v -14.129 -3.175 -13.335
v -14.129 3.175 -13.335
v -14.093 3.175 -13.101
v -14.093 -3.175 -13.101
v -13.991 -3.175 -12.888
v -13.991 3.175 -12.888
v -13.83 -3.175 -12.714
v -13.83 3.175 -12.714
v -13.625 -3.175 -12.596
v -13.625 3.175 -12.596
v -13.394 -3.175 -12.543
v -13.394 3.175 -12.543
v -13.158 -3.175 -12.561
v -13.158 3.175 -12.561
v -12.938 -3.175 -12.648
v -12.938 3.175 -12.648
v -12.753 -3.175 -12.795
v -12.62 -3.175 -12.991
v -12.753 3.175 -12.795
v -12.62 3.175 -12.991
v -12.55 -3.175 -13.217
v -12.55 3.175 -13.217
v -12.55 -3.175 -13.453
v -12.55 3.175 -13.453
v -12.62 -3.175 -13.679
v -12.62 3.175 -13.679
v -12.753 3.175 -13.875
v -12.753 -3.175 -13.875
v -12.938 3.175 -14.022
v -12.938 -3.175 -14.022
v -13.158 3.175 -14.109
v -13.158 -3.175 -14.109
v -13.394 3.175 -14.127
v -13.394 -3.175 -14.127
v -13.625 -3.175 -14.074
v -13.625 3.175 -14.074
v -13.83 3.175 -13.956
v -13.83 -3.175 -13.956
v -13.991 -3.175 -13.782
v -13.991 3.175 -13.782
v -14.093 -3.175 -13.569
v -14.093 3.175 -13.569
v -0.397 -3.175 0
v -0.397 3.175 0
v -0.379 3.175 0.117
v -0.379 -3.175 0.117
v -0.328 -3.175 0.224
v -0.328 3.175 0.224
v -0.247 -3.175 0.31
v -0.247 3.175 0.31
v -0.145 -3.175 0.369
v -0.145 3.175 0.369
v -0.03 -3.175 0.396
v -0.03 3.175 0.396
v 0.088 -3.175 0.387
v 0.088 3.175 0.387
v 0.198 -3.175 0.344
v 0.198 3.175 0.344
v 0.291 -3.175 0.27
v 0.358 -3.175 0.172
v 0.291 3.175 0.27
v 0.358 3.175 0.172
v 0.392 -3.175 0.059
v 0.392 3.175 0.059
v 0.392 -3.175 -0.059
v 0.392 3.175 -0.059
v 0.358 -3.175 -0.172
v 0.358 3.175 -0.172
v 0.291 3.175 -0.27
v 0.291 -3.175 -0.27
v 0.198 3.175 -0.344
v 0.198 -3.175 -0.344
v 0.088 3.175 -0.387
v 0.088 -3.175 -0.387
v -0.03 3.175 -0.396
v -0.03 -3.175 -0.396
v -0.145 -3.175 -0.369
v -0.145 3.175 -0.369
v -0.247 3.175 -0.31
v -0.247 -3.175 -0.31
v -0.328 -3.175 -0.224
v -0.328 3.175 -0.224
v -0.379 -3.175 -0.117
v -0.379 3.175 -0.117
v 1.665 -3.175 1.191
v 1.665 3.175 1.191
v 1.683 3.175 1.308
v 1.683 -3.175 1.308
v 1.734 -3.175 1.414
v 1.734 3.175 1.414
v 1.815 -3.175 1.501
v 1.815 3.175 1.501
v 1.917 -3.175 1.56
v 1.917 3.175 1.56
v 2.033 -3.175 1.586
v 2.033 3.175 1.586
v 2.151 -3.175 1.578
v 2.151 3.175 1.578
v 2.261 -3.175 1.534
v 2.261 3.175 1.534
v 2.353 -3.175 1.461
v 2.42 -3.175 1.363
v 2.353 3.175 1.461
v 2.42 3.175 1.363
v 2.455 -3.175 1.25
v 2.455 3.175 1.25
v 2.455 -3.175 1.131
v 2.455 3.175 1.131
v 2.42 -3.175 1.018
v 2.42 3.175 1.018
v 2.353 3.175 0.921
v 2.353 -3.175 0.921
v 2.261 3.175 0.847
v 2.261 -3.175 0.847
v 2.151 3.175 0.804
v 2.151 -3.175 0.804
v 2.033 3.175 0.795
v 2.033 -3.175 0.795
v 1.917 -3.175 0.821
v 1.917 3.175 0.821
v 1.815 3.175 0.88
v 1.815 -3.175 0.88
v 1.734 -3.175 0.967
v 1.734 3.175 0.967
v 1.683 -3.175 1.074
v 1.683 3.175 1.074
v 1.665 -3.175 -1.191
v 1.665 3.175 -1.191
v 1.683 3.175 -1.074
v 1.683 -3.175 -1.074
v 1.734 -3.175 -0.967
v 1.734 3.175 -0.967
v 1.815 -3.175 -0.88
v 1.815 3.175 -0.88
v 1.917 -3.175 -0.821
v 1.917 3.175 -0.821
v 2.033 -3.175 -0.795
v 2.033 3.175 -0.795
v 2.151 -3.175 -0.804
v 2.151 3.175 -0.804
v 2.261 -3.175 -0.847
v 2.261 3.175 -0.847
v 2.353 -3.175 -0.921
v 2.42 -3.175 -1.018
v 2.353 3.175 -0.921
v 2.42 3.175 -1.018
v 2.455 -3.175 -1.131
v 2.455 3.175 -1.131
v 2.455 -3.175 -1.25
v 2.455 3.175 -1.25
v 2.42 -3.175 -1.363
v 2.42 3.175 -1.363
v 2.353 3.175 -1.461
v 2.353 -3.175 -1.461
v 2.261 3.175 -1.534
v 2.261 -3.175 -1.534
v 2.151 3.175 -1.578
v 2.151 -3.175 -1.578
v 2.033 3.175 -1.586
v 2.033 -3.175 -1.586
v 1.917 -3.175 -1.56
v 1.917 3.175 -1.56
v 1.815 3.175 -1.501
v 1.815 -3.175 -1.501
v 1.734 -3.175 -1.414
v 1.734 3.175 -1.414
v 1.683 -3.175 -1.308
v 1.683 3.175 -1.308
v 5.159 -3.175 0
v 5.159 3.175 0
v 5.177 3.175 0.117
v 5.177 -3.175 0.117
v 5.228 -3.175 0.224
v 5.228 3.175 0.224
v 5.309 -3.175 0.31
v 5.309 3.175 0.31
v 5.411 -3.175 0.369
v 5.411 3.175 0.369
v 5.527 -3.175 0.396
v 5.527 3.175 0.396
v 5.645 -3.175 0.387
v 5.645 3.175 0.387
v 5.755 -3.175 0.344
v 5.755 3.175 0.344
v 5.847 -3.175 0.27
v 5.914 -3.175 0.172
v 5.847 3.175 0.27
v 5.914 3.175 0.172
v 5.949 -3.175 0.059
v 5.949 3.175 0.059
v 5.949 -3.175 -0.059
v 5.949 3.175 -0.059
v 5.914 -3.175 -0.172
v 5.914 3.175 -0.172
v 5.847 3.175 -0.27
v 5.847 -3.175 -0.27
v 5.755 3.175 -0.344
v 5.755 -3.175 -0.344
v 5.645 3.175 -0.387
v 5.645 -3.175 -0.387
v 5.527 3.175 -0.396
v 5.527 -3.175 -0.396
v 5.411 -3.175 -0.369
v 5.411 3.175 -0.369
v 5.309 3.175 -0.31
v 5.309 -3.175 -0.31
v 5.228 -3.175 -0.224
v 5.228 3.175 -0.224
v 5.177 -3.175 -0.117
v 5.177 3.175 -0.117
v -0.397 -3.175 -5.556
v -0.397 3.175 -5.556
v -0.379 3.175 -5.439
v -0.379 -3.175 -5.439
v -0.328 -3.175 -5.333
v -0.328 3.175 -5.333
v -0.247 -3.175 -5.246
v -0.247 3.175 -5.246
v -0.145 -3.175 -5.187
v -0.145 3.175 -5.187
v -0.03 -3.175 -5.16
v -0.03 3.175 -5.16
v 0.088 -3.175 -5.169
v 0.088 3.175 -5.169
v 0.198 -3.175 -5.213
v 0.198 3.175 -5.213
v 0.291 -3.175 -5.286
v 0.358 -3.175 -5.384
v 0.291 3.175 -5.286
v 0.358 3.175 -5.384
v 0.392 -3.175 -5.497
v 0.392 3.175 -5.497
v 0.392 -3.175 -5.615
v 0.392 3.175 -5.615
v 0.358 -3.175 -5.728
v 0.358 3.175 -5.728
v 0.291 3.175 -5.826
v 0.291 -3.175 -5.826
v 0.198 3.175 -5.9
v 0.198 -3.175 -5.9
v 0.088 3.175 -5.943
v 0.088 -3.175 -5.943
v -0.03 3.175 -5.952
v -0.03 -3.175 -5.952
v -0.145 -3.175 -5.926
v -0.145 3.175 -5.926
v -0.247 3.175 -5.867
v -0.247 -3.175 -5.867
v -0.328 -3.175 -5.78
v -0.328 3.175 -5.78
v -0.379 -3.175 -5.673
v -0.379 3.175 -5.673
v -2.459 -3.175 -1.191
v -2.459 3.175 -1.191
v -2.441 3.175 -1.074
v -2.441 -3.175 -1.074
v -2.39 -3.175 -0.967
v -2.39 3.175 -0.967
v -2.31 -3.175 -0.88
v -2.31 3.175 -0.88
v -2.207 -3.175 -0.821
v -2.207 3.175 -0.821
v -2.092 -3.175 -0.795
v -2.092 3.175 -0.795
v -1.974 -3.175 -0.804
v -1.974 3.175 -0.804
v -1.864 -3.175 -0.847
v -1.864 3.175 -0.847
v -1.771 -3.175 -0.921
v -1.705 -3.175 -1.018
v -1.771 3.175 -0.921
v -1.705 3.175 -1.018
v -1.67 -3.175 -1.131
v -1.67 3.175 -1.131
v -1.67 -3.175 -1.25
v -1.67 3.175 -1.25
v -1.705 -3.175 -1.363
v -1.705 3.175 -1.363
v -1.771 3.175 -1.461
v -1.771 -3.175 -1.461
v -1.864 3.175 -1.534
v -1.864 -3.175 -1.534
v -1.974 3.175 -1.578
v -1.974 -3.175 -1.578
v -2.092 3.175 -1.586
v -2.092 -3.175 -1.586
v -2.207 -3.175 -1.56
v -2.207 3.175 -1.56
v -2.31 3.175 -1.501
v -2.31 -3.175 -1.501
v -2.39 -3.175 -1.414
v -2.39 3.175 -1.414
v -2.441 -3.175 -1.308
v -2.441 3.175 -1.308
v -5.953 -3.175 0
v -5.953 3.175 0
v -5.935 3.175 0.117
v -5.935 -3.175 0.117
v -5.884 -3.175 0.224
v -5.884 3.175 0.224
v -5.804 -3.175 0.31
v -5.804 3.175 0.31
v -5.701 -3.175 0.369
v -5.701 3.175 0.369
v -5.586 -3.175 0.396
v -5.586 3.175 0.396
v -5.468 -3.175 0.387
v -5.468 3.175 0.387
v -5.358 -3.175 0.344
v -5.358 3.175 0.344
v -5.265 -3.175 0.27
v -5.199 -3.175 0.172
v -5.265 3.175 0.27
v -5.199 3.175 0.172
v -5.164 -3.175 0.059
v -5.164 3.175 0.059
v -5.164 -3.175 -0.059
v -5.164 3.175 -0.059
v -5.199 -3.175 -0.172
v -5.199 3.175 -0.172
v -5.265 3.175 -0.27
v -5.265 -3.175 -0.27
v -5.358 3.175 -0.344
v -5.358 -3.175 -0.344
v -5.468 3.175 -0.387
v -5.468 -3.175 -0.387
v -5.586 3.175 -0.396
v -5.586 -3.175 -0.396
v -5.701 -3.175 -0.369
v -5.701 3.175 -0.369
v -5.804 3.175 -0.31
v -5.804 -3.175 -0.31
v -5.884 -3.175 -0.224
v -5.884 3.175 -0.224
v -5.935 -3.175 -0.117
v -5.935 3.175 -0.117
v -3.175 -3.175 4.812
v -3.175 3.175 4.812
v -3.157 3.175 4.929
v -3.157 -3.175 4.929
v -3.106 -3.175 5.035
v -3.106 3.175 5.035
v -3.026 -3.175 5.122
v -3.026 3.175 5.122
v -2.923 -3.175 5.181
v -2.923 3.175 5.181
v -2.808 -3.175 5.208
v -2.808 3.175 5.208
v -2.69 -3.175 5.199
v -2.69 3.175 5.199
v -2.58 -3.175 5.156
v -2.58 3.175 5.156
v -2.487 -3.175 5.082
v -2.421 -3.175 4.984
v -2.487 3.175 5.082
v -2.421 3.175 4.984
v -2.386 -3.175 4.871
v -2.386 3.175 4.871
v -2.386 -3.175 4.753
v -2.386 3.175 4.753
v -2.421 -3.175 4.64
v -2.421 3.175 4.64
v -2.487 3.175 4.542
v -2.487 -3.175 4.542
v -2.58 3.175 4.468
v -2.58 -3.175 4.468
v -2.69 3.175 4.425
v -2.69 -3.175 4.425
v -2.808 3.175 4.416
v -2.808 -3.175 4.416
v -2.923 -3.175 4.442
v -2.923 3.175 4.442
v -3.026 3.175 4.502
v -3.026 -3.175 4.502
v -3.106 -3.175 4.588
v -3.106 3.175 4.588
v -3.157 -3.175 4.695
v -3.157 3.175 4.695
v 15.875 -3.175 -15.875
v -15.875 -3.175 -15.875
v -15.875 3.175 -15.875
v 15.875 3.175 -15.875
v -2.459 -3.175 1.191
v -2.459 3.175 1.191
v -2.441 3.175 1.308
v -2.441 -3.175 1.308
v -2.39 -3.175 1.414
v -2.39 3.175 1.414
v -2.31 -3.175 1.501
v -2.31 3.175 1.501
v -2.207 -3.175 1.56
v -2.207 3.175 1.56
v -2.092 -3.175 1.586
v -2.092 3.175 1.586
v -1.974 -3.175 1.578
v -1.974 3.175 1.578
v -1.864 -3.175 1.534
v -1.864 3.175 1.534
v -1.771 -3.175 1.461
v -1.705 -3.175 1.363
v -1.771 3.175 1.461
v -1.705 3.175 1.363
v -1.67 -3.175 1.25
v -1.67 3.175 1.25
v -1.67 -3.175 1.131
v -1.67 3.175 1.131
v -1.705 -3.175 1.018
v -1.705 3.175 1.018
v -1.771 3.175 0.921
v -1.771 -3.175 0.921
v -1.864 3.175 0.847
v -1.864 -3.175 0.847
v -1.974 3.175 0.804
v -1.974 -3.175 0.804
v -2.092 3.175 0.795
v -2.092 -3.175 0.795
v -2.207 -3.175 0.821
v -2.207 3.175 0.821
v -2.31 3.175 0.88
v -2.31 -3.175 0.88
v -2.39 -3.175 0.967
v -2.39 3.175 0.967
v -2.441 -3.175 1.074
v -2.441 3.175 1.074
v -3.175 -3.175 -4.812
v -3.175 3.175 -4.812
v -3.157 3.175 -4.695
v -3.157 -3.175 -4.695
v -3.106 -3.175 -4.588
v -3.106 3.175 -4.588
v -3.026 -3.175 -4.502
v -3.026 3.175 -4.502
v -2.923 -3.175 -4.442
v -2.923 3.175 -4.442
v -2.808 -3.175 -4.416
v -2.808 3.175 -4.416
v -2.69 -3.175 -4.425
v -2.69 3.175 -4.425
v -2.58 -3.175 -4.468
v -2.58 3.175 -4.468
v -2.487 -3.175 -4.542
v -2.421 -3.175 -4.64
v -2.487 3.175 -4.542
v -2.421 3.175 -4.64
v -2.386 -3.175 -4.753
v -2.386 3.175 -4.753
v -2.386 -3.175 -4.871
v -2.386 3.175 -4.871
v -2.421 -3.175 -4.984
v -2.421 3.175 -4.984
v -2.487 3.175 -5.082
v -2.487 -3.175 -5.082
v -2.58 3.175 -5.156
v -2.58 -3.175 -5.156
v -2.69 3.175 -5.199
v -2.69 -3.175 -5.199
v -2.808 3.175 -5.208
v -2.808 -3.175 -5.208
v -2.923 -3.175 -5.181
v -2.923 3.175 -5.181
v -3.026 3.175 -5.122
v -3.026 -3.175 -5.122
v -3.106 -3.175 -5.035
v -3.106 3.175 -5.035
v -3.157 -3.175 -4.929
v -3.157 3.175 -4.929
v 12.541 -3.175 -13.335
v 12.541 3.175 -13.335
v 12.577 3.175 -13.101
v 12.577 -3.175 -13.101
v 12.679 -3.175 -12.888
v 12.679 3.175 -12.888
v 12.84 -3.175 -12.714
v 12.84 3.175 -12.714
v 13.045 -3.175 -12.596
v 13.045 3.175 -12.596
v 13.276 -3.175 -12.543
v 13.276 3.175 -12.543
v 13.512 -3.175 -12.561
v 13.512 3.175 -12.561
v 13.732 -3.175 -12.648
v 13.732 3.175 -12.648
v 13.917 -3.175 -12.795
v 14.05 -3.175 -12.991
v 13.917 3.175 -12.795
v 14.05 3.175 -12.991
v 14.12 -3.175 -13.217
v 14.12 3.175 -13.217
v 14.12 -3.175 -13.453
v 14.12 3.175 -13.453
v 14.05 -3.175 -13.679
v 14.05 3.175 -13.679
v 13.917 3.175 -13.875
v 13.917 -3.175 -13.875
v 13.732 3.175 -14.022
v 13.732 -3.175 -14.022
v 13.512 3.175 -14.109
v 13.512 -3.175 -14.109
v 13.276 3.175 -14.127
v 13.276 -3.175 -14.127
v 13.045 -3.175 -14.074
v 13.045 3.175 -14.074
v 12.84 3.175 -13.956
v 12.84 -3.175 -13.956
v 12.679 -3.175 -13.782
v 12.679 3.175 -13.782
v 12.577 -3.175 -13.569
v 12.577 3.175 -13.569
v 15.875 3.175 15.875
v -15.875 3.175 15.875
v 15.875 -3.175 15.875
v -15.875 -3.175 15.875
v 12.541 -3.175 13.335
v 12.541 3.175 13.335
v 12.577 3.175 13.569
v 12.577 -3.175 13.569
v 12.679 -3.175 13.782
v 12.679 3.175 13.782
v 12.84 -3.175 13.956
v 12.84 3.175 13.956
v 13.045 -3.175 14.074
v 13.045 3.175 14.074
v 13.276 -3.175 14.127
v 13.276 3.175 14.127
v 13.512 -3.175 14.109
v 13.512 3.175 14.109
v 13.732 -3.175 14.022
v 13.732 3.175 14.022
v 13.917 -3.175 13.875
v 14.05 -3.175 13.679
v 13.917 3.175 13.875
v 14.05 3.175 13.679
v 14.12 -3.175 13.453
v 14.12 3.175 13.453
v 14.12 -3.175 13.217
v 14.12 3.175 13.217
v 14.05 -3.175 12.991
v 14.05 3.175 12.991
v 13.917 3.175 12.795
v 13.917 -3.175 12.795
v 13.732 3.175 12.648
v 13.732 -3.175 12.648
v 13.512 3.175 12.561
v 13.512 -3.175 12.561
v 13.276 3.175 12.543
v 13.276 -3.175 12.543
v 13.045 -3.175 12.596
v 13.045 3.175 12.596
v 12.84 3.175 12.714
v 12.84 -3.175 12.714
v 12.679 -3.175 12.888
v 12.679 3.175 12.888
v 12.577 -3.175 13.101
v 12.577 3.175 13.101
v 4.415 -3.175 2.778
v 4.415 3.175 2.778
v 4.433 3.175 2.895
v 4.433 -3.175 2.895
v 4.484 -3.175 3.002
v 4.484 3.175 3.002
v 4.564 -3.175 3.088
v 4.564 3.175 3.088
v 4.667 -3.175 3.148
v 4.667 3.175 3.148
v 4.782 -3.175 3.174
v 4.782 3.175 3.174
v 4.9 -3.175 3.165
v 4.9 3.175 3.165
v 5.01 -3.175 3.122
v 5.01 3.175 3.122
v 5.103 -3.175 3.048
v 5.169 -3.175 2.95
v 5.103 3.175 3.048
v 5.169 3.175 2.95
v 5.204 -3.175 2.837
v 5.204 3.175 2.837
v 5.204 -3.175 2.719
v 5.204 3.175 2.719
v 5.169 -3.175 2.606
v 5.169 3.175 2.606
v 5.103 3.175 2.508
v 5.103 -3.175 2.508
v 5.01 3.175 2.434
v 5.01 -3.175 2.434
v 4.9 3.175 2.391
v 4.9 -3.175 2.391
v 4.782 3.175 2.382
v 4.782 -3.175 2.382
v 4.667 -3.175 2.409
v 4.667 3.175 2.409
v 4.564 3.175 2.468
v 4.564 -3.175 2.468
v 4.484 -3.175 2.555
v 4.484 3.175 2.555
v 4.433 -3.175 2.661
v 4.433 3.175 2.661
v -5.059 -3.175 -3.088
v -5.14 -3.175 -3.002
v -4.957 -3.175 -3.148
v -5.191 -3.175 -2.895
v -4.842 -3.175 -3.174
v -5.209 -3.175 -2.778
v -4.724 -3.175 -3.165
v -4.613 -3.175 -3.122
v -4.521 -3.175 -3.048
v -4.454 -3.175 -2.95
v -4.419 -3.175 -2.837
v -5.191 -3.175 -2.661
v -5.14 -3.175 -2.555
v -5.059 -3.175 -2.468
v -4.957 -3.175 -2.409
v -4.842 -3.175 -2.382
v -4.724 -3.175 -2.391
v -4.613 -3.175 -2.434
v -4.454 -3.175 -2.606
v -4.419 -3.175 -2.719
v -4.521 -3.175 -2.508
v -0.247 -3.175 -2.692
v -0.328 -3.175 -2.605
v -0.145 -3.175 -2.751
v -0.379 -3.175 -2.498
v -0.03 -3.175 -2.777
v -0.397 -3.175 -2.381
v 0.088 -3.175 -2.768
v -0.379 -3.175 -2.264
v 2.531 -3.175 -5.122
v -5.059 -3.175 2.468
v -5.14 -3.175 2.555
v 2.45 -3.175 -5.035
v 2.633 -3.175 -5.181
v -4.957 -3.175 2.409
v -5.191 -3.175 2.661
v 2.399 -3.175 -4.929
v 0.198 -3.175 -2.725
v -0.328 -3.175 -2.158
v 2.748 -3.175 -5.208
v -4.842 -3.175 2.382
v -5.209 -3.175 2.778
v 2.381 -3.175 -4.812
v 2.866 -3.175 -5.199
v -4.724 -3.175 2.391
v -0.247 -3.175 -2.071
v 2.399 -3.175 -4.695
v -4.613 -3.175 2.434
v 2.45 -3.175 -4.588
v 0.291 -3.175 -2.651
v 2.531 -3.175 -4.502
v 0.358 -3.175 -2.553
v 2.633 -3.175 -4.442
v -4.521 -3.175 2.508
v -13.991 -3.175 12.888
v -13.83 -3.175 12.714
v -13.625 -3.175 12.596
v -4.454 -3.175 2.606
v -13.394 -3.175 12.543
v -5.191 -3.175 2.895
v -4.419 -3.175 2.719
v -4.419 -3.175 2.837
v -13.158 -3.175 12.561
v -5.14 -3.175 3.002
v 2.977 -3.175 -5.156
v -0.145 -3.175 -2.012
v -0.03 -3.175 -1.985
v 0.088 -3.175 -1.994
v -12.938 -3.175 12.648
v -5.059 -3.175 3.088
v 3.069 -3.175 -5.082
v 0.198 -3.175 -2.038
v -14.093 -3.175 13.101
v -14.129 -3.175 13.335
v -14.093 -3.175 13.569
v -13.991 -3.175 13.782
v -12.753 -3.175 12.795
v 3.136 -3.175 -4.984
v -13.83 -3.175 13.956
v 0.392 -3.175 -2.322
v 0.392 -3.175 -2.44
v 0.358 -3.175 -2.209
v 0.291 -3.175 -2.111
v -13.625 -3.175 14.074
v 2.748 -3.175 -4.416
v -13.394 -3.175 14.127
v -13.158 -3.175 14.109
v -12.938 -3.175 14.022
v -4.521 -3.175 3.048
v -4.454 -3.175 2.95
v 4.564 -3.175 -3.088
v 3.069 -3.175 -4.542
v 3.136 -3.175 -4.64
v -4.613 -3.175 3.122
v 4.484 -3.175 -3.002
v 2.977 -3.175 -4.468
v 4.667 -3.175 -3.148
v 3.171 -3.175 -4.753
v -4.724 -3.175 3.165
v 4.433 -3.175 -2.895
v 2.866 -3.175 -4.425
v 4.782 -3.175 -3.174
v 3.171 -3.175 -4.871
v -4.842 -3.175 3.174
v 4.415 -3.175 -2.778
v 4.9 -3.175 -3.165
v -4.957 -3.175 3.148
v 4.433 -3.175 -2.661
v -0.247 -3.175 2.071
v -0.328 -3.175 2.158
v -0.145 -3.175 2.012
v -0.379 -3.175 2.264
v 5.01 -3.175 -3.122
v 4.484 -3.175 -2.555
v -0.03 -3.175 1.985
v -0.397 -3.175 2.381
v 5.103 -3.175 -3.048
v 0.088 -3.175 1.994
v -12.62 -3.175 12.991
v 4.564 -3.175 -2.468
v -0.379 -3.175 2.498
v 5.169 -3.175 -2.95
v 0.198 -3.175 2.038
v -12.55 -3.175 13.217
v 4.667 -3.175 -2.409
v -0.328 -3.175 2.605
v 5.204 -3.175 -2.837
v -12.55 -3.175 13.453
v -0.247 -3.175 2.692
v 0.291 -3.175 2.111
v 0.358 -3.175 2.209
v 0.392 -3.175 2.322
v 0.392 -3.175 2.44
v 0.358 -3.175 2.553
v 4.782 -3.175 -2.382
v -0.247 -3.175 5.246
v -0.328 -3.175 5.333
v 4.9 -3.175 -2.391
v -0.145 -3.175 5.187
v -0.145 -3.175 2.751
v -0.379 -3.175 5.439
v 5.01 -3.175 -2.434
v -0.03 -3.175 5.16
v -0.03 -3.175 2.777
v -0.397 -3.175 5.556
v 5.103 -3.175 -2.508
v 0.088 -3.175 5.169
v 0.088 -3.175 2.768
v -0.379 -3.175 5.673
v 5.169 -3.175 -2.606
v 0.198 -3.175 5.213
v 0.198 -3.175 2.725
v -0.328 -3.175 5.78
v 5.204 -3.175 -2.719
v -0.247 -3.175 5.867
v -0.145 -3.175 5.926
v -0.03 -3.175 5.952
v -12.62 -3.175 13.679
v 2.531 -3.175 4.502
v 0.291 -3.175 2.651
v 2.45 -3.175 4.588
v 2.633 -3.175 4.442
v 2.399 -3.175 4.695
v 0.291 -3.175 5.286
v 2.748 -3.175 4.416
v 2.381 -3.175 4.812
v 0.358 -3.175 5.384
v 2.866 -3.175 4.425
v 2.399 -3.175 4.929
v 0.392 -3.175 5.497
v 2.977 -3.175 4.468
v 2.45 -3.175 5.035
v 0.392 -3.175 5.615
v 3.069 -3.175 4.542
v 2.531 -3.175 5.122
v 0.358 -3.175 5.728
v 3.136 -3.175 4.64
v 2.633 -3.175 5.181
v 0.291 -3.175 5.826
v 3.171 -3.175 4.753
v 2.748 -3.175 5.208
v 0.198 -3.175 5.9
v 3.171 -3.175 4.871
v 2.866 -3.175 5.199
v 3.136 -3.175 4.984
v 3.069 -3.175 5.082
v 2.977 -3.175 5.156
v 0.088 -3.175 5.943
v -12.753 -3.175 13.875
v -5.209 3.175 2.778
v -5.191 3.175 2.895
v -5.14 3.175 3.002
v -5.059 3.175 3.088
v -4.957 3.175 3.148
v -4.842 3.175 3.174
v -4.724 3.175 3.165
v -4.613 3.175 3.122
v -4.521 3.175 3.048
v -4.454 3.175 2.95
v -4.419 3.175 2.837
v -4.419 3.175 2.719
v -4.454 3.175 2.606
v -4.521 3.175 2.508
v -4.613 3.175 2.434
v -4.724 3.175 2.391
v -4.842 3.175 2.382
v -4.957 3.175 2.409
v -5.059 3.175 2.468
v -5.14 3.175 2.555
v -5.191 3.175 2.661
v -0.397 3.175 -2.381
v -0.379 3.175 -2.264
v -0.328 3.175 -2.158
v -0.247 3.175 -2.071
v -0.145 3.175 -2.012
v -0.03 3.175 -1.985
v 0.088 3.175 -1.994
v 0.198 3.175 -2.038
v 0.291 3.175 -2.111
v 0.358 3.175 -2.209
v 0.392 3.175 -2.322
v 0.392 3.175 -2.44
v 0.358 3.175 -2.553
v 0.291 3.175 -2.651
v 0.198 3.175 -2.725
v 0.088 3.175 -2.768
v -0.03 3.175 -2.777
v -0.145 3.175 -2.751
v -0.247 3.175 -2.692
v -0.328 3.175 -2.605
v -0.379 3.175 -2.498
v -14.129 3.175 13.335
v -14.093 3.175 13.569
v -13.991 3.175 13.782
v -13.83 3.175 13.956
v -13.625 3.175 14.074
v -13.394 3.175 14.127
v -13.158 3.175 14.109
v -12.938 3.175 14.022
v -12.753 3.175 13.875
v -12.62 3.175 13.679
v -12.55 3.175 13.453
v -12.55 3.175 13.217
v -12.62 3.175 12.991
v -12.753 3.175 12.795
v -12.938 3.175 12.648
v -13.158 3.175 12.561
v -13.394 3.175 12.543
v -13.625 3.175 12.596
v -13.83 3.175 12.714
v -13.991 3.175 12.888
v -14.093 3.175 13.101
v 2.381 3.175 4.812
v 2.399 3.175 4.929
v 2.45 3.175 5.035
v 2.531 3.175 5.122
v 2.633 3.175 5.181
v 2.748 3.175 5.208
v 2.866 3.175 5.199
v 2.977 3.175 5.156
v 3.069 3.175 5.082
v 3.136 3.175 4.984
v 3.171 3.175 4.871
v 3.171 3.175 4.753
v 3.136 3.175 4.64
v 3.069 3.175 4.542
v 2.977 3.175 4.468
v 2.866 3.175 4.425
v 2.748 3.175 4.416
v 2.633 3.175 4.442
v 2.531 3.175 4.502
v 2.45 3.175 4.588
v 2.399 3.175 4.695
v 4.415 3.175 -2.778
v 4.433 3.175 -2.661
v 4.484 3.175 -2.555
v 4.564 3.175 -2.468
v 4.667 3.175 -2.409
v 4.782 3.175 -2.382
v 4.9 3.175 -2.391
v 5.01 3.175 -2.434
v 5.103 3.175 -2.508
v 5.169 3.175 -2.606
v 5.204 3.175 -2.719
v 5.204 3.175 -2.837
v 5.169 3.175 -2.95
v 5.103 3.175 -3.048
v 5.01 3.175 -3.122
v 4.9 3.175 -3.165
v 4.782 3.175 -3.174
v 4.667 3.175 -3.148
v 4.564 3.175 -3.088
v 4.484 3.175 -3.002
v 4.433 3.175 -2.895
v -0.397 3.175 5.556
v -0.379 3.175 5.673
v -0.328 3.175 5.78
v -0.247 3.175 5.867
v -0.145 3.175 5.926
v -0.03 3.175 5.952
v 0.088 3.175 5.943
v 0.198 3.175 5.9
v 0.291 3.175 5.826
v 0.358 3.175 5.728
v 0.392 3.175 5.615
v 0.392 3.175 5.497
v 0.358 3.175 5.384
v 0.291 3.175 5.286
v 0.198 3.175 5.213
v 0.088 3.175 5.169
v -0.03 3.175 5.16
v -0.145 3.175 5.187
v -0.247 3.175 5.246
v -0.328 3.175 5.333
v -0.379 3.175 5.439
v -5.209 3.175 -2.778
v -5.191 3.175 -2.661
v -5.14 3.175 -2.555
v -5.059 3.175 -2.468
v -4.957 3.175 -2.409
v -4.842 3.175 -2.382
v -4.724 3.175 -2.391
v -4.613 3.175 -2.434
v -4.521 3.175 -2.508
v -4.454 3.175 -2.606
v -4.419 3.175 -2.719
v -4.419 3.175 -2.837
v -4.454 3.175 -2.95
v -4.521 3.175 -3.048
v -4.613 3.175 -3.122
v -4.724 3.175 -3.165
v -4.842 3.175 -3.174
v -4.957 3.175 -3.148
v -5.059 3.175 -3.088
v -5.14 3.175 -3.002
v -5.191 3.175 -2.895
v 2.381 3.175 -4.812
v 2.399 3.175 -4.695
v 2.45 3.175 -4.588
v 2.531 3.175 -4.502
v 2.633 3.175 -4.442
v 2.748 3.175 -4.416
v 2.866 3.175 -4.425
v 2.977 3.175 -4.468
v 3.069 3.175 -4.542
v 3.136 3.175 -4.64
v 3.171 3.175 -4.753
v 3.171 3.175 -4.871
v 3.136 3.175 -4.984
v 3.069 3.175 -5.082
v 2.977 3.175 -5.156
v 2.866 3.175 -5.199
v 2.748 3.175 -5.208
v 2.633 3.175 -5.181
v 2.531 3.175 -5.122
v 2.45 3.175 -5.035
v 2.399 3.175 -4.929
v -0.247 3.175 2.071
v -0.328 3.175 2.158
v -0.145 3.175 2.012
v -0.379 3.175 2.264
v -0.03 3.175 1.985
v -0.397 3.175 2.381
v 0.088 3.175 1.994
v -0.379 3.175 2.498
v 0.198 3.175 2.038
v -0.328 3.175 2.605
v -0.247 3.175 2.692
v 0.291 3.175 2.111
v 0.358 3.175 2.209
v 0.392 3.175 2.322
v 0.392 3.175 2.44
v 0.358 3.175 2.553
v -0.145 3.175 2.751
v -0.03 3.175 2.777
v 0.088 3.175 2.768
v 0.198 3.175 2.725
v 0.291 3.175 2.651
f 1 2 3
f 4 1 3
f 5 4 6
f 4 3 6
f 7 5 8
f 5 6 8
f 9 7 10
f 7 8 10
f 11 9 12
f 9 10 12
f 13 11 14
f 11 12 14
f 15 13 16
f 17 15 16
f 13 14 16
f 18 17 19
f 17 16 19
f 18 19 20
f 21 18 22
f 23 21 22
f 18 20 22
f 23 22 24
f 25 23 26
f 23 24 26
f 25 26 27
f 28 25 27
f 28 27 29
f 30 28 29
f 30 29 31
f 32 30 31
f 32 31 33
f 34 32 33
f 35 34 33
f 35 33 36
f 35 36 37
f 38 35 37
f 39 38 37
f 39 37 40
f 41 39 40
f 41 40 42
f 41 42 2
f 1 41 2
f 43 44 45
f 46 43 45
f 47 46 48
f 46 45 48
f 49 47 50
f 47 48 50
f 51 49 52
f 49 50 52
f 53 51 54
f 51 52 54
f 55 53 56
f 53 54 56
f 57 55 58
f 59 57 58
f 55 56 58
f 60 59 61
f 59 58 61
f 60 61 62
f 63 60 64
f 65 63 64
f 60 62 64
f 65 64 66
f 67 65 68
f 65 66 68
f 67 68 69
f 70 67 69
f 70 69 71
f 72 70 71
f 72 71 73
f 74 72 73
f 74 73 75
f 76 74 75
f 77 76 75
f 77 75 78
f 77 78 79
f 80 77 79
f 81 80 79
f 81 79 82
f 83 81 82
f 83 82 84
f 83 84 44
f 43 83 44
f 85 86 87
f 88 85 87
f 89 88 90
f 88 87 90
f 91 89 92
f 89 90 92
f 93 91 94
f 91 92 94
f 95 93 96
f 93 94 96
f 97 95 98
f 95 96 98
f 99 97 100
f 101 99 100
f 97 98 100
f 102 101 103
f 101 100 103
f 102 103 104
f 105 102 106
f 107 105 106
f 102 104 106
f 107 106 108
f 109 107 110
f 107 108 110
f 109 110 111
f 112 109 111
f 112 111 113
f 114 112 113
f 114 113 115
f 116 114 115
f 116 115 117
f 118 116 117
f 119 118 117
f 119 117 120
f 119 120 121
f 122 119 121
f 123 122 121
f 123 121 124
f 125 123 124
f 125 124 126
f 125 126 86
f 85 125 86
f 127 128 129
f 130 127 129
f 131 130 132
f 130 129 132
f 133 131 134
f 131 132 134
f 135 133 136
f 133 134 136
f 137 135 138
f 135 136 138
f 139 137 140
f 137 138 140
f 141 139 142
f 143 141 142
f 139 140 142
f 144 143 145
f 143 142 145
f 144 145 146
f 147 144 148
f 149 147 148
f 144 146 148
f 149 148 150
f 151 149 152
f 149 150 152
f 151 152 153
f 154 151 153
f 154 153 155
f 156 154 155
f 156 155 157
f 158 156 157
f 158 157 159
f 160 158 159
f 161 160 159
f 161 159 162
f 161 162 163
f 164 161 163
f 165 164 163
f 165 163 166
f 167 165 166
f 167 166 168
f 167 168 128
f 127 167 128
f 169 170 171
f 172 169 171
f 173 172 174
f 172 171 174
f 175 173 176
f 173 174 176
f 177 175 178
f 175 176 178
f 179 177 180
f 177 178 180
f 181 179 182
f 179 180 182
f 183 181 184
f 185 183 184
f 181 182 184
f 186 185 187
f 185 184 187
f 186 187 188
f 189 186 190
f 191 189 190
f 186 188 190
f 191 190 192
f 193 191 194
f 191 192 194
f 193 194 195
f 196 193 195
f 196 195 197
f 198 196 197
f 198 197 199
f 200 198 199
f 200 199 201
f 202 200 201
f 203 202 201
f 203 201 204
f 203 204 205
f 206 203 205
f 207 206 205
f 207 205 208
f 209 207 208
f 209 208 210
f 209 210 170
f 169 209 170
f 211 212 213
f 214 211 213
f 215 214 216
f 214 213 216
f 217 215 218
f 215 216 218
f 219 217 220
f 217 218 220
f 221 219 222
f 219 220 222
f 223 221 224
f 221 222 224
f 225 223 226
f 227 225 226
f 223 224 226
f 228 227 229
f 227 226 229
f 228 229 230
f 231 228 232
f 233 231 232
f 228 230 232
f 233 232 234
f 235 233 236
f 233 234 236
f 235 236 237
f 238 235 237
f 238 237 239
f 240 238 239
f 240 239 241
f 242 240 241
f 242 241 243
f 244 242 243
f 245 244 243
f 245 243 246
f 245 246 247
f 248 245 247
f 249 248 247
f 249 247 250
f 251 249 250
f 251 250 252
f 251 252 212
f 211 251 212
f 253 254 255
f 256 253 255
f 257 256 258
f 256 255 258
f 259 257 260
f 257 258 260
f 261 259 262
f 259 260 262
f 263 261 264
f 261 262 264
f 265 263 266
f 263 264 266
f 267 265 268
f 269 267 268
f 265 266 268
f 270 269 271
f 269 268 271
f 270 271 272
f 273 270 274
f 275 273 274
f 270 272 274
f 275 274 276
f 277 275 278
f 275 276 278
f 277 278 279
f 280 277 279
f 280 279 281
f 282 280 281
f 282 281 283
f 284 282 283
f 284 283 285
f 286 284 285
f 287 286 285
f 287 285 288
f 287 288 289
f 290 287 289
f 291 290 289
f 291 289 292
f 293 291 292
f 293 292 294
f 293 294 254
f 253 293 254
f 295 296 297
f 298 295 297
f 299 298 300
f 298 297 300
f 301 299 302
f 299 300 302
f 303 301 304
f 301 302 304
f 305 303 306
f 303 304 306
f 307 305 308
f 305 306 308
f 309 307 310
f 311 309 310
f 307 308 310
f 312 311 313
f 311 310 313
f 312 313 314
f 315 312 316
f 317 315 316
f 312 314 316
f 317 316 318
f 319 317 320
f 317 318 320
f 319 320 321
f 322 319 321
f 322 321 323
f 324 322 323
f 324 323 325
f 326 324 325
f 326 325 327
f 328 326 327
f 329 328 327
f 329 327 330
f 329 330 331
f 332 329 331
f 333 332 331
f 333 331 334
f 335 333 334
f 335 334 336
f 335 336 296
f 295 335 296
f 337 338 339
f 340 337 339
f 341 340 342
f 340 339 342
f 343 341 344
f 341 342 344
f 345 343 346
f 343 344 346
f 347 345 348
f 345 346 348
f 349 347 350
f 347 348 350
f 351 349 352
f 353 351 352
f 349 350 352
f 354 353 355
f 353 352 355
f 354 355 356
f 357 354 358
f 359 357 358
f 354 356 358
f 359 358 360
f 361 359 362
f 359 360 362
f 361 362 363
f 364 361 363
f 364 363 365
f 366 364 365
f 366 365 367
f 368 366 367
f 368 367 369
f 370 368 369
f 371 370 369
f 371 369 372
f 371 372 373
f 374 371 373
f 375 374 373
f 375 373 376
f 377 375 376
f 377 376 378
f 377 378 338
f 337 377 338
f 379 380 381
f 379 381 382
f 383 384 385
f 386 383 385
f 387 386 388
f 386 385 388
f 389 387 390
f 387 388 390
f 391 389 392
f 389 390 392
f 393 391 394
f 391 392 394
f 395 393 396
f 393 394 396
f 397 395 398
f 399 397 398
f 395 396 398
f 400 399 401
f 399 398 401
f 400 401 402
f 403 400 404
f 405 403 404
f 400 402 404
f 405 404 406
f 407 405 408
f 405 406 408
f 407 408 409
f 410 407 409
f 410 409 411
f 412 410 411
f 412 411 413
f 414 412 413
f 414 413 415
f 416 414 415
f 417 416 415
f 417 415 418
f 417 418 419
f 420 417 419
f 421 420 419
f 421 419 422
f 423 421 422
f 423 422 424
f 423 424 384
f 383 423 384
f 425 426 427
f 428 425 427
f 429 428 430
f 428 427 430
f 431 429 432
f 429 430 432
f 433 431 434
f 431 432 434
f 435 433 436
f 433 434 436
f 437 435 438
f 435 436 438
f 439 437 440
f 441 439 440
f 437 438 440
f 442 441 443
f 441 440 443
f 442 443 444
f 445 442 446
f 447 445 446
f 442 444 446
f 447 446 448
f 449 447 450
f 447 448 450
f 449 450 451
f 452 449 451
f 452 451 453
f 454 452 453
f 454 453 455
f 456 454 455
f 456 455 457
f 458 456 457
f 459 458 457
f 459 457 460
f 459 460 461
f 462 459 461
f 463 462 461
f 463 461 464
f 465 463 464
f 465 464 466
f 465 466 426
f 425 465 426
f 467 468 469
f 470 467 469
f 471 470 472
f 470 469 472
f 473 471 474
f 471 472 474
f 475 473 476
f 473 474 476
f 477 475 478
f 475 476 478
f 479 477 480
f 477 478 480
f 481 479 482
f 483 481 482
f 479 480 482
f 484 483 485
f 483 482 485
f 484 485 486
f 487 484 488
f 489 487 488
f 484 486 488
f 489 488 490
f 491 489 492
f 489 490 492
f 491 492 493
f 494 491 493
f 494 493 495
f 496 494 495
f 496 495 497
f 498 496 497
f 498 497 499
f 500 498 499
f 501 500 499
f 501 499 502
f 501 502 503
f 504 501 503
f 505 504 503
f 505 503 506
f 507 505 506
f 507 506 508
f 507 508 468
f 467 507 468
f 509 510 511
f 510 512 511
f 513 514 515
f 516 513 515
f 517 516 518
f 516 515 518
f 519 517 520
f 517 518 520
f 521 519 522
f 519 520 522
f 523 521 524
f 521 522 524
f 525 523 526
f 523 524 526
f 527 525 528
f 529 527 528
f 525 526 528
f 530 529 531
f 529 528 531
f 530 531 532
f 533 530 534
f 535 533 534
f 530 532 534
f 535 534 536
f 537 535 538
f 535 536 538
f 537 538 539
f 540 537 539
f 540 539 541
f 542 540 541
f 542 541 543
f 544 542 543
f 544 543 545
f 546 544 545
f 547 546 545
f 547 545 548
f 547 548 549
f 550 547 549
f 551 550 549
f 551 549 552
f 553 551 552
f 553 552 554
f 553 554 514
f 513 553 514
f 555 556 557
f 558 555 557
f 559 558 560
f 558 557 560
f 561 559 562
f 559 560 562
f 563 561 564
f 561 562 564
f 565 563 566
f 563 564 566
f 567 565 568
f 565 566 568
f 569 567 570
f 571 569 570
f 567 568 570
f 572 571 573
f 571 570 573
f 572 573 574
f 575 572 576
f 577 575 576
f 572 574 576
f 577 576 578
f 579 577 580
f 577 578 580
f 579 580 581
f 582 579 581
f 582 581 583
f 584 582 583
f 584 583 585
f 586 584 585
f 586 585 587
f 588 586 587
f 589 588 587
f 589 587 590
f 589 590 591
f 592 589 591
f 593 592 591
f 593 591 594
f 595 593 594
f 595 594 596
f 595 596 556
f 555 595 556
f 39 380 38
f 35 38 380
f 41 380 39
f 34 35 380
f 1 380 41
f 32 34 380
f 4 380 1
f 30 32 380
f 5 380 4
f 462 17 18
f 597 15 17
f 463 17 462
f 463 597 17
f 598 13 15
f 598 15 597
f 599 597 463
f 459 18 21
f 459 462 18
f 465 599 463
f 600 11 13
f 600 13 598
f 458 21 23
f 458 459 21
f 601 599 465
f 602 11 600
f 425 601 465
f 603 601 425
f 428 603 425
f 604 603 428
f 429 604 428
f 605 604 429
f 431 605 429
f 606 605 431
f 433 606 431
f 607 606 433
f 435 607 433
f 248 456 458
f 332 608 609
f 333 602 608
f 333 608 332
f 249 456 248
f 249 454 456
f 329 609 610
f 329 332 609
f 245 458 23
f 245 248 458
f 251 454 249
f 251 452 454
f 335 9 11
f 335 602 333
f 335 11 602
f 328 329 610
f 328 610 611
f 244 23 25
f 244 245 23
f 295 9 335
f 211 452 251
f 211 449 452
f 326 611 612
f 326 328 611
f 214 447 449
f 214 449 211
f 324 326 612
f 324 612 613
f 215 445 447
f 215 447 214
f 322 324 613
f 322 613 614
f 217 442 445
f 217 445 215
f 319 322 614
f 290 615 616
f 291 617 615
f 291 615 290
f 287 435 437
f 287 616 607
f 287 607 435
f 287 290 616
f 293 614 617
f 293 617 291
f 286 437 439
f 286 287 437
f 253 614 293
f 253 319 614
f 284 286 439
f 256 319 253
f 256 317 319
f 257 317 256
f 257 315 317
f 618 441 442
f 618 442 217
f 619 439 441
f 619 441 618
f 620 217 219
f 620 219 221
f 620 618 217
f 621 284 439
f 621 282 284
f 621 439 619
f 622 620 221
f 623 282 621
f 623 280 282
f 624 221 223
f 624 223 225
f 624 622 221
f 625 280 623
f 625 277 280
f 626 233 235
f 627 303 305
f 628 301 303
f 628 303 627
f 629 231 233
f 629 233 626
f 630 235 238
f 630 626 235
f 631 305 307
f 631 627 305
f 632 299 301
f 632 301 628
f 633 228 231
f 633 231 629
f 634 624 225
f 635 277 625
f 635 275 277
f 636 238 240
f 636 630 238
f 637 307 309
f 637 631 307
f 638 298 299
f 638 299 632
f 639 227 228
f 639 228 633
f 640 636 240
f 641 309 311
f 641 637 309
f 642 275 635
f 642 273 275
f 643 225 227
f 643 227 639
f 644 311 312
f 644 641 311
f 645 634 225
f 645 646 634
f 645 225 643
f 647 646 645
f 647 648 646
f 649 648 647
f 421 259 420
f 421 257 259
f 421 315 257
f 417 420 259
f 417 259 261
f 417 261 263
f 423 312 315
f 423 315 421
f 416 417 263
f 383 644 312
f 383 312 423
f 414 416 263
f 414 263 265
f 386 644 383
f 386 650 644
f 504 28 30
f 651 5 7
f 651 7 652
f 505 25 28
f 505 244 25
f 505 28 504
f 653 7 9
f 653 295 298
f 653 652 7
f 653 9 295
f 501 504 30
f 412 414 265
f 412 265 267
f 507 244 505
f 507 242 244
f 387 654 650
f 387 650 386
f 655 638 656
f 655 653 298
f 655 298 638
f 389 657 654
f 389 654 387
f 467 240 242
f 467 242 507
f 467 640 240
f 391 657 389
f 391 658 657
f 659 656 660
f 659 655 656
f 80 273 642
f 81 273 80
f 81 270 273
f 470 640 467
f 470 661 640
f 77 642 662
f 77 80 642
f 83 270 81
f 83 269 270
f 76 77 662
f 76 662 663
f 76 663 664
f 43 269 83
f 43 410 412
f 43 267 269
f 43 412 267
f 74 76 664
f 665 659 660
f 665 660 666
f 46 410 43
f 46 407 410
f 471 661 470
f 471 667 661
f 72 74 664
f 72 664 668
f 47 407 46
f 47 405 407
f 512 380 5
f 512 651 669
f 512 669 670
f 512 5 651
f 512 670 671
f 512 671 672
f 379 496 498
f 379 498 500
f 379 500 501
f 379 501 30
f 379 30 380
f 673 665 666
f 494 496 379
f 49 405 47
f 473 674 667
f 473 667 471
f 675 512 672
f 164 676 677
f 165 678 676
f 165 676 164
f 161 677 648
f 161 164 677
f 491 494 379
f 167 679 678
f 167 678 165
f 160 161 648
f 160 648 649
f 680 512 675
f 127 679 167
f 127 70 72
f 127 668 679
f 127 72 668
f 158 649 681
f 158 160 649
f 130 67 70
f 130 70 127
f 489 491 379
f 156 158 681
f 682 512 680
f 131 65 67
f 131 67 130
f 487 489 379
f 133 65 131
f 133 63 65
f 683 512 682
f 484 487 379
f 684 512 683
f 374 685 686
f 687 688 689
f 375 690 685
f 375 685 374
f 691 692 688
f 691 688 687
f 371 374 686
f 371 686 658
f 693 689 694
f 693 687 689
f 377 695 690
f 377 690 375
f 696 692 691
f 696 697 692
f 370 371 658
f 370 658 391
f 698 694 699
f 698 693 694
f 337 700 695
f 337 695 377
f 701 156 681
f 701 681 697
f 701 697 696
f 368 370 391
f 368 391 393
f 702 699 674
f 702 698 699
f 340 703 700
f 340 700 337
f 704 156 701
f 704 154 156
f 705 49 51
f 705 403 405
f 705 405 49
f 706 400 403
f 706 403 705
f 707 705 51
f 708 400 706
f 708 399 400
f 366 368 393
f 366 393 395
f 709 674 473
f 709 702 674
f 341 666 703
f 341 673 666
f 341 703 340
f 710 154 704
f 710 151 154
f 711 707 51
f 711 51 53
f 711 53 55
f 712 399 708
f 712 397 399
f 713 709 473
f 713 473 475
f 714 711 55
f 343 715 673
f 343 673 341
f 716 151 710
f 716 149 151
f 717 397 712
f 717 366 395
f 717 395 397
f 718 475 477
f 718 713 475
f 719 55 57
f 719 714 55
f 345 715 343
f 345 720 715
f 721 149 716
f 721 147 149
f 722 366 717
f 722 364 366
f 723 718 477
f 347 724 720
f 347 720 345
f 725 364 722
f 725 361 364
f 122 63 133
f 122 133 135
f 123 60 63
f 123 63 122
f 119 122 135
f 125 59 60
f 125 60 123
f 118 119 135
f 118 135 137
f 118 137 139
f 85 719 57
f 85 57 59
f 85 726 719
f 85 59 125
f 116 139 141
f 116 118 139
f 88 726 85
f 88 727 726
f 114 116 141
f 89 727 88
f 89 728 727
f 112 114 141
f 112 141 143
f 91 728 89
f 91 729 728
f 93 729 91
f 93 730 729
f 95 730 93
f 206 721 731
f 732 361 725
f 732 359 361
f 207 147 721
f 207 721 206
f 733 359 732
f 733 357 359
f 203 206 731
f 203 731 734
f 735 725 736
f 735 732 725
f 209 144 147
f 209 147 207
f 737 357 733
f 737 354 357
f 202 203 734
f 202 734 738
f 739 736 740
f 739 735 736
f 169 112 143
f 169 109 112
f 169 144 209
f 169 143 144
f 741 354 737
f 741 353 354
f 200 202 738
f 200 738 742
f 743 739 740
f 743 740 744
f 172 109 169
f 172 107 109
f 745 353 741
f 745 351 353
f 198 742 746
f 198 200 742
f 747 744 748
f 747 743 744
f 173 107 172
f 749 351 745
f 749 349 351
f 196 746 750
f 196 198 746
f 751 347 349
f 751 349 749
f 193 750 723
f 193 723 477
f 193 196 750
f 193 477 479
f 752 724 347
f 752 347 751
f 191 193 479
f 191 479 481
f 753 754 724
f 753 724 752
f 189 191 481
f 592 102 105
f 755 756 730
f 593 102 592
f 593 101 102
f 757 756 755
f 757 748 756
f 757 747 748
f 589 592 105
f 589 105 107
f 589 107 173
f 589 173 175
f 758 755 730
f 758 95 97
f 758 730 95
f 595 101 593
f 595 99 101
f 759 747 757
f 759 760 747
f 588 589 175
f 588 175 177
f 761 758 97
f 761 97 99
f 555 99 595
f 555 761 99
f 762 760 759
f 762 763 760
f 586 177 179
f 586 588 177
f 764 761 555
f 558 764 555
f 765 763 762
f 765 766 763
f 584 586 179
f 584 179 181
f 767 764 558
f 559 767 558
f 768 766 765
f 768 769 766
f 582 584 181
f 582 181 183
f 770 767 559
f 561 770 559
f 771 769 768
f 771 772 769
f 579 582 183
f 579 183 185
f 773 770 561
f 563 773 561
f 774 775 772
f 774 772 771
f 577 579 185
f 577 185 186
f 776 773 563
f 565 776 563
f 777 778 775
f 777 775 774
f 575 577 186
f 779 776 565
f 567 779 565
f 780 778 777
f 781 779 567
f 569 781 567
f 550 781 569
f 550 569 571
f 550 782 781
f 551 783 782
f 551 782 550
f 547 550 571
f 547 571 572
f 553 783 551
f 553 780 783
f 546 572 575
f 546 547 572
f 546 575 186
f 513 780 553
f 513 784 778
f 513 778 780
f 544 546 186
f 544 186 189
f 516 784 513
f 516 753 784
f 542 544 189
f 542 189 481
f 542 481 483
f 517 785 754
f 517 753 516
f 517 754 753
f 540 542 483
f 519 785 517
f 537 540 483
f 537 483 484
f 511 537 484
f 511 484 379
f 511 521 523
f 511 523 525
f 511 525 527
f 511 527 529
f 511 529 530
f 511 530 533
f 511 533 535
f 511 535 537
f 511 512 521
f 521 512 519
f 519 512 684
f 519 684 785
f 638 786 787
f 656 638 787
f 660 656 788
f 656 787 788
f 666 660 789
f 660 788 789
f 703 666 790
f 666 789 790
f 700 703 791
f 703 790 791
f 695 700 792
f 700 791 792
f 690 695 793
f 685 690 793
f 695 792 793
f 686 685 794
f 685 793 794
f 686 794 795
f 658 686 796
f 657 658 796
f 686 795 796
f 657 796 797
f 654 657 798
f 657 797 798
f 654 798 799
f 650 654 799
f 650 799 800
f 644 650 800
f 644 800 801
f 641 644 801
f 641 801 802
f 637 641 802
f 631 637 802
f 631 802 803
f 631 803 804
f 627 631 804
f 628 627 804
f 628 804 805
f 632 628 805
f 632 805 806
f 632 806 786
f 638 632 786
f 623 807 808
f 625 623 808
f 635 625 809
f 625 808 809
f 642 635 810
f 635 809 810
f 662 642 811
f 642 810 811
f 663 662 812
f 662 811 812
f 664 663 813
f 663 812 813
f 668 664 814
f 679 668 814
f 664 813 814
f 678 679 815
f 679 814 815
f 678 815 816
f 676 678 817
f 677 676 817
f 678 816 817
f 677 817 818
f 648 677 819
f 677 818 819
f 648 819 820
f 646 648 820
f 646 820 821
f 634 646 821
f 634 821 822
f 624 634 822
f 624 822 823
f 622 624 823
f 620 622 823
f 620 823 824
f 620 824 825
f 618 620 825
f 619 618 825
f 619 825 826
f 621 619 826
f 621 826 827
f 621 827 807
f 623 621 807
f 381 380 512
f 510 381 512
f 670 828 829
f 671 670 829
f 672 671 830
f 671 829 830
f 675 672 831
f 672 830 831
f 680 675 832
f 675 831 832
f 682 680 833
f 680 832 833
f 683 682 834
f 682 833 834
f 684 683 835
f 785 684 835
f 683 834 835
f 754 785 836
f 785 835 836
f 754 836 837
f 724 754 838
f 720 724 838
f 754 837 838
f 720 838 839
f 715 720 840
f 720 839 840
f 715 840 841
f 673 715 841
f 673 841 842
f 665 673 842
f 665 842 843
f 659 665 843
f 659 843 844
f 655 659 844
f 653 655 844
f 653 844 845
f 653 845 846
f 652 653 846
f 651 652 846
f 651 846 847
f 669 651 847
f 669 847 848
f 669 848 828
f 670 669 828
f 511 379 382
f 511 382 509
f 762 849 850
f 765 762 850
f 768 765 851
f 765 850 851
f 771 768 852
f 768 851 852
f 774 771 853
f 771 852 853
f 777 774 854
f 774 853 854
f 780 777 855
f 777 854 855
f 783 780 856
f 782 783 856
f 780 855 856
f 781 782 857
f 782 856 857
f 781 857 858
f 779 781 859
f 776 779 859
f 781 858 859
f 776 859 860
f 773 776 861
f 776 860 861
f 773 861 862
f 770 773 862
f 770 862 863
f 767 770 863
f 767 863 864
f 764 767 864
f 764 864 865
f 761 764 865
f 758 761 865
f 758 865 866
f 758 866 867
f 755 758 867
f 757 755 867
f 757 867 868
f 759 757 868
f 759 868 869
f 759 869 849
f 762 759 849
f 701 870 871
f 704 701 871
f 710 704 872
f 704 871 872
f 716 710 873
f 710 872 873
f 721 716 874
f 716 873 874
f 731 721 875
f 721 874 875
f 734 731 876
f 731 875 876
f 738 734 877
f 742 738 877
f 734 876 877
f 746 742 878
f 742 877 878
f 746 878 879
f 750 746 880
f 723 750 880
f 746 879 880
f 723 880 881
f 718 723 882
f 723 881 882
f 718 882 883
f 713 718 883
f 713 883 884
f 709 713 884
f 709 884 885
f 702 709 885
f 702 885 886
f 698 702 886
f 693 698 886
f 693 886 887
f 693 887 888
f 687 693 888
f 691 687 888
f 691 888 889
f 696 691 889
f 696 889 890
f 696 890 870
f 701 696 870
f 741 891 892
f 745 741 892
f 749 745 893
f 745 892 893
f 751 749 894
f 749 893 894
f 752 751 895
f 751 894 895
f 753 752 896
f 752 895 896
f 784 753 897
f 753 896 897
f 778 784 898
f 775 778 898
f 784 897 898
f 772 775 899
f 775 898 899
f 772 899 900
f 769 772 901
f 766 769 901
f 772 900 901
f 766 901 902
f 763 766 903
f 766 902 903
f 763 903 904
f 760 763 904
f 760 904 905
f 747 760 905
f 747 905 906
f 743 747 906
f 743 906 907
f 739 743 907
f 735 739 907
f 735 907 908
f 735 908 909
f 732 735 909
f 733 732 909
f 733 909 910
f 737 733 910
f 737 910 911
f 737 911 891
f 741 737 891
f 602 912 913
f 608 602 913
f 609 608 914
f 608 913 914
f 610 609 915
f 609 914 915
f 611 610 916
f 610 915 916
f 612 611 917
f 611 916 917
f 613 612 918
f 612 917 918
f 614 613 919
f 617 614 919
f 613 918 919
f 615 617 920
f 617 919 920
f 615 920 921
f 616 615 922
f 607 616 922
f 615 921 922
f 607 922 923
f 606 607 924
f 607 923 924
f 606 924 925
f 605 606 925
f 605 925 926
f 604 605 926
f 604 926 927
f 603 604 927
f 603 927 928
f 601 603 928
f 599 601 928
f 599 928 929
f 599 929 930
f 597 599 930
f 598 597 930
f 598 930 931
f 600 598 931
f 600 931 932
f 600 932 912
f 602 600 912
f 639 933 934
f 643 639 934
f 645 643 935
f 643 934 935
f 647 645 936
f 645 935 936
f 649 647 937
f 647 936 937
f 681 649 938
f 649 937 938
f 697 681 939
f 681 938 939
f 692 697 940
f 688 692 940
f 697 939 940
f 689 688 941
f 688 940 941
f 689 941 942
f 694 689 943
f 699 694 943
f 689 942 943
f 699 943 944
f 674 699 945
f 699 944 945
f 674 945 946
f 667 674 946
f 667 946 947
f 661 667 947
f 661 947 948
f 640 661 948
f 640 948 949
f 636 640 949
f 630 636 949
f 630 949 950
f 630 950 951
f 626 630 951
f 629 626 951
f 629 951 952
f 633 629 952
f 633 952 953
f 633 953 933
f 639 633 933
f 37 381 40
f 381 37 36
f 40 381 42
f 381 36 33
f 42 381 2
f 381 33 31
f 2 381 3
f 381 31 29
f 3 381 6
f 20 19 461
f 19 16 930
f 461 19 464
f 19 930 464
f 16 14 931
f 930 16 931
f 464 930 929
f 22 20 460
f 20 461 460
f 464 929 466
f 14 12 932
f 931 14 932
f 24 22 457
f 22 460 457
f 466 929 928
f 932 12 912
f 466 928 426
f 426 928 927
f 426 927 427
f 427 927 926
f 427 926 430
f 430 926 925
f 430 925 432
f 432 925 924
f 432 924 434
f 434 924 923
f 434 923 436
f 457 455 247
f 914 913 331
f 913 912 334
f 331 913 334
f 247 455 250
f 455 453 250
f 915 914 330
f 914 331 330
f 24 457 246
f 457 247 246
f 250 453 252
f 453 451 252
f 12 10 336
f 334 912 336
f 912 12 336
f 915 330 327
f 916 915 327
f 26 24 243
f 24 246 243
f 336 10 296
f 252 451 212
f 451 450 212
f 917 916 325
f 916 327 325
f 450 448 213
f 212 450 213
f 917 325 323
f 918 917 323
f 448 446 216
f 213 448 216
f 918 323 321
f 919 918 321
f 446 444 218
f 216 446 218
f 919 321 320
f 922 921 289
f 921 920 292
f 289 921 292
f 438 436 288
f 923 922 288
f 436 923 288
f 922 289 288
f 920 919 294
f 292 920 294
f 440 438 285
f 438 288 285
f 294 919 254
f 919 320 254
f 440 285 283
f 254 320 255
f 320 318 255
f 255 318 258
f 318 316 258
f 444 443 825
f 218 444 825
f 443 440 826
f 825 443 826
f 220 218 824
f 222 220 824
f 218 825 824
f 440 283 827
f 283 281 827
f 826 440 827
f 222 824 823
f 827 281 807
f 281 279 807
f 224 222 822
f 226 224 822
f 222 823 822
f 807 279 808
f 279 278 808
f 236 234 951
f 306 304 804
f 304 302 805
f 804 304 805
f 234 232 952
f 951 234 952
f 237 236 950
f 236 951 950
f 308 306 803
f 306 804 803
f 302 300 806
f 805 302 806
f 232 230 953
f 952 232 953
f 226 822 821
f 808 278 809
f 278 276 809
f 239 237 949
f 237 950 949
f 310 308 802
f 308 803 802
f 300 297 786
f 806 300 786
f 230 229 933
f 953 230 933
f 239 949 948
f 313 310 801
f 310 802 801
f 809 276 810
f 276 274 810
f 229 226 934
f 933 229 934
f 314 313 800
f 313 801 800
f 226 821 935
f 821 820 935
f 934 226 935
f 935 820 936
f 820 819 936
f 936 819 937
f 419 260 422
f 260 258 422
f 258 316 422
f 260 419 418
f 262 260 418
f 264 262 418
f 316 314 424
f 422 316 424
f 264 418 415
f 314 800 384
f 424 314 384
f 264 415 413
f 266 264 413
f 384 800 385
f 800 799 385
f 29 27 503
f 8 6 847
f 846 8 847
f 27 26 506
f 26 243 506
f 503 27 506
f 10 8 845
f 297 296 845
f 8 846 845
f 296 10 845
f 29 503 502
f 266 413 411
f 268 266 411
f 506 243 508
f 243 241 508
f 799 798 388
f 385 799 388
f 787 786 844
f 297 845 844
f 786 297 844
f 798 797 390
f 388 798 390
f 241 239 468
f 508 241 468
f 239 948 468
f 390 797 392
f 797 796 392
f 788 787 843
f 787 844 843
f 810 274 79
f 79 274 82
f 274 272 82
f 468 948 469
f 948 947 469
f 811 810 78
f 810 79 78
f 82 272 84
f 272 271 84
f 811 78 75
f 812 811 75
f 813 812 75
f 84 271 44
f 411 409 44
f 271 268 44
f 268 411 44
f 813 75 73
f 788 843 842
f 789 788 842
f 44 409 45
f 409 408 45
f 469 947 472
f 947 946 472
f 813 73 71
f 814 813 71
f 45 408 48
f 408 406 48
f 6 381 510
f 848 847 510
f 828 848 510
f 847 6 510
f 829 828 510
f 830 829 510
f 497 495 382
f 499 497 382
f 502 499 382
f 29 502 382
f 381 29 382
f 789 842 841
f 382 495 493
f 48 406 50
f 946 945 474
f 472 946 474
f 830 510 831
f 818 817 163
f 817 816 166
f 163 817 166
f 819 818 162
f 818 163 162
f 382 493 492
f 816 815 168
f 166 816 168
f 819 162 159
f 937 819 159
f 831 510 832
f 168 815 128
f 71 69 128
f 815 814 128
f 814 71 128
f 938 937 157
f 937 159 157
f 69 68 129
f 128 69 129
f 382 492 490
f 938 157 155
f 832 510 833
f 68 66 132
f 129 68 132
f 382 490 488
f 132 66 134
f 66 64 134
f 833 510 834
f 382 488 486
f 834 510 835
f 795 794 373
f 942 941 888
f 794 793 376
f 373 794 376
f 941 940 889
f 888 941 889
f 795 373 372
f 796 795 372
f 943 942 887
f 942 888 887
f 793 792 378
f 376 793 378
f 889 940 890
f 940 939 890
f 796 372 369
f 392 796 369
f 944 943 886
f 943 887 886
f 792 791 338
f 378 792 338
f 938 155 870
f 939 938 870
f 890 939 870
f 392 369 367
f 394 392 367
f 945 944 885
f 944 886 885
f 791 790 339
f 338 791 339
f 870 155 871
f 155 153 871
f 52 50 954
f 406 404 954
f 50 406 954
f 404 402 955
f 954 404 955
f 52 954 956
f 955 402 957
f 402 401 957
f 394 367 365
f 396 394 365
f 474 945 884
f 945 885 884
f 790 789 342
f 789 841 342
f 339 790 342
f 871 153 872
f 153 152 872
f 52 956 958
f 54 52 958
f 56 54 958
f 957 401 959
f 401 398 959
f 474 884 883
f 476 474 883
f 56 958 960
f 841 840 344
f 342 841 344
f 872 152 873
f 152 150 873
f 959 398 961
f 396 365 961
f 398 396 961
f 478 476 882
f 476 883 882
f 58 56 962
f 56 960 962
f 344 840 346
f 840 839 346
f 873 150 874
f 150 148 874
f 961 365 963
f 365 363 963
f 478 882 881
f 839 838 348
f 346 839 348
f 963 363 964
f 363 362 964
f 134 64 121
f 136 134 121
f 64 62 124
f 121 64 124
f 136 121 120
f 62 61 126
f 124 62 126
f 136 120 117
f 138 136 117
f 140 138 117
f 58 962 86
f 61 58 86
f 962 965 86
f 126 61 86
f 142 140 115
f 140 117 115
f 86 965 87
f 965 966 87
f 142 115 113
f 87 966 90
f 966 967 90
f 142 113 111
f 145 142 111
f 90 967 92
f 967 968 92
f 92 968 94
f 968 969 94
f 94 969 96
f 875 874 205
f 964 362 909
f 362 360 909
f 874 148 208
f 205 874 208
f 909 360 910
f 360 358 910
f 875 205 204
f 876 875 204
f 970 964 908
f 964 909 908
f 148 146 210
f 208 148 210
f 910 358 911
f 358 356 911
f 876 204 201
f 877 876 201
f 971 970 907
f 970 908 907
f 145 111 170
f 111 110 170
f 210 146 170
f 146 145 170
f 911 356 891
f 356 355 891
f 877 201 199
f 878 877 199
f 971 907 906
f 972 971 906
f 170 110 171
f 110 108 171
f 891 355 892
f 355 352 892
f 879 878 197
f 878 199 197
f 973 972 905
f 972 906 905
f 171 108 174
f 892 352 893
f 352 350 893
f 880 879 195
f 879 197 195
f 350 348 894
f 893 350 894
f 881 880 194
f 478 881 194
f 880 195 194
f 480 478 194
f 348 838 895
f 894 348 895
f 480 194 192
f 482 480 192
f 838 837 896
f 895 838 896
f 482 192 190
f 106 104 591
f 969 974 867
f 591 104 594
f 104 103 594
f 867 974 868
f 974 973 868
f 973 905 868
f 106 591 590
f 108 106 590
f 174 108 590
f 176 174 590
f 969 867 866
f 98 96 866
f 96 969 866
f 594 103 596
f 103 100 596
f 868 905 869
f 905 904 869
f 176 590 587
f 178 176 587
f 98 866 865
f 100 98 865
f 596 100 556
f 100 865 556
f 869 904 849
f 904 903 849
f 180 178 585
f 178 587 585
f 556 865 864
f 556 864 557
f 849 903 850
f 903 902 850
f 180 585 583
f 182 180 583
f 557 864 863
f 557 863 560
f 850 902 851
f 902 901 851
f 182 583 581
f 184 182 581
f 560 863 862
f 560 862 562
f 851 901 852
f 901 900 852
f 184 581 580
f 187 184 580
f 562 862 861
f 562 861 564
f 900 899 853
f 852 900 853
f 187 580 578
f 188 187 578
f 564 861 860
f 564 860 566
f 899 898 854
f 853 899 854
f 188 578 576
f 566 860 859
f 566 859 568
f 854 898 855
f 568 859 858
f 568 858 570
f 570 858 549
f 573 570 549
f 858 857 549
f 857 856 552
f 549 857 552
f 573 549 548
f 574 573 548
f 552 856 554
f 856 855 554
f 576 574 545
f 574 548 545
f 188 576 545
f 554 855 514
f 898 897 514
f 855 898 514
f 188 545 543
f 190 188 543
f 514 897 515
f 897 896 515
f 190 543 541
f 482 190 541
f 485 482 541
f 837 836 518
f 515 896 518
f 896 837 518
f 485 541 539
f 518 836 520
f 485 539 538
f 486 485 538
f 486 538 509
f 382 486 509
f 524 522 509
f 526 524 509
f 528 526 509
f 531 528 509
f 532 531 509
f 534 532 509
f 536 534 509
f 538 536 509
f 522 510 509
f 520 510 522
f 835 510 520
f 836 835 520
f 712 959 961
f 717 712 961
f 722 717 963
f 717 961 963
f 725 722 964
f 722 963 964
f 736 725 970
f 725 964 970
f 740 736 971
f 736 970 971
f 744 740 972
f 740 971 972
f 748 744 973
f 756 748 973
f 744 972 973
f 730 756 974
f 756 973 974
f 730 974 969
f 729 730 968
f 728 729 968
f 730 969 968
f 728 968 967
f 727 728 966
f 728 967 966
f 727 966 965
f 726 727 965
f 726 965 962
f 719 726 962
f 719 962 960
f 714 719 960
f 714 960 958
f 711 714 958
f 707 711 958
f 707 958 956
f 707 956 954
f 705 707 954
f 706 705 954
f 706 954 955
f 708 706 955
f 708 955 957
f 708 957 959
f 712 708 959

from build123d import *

# Parameters (mm, degrees)
F0_W     = 31.75
F0_H     = 31.75
F1_DEPTH = 3.175
F3_D     = 0.79375
F5_D     = 1.5875


# Not quite as in the source:
# - a feature names something its author has since deleted; it is built from what else it names


with BuildPart() as f1:
    # F0 (on Front) → F1 (new body, symmetric)
    with BuildSketch(Plane.XZ):
        Rectangle(F0_W, F0_H)
    extrude(amount=F1_DEPTH, both=True)

    # F3 (through all)
    with Locations(Plane.XZ.offset(3.175)):
        with Locations((0, 0), (0, 2.38125), (2.0622229928, 1.190625), (2.0622229928, -1.190625), (0, -2.38125), (-2.0622229928, -1.190625), (-2.0622229928, 1.190625), (-4.8118536498, 2.778125), (-2.778125, 4.8118536498), (0, 5.55625), (2.778125, 4.8118536498), (4.8118536498, 2.778125), (5.55625, 0), (4.8118536498, -2.778125), (2.778125, -4.8118536498), (0, -5.55625), (-2.778125, -4.8118536498), (-4.8118536498, -2.778125), (-5.55625, 0)):
            Hole(F3_D / 2)

    # F5 (through all)
    with Locations(Plane.XZ.offset(3.175)):
        with Locations((-13.335, 13.335), (-13.335, -13.335), (13.335, 13.335), (13.335, -13.335)):
            Hole(F5_D / 2)


solid = f1.part
